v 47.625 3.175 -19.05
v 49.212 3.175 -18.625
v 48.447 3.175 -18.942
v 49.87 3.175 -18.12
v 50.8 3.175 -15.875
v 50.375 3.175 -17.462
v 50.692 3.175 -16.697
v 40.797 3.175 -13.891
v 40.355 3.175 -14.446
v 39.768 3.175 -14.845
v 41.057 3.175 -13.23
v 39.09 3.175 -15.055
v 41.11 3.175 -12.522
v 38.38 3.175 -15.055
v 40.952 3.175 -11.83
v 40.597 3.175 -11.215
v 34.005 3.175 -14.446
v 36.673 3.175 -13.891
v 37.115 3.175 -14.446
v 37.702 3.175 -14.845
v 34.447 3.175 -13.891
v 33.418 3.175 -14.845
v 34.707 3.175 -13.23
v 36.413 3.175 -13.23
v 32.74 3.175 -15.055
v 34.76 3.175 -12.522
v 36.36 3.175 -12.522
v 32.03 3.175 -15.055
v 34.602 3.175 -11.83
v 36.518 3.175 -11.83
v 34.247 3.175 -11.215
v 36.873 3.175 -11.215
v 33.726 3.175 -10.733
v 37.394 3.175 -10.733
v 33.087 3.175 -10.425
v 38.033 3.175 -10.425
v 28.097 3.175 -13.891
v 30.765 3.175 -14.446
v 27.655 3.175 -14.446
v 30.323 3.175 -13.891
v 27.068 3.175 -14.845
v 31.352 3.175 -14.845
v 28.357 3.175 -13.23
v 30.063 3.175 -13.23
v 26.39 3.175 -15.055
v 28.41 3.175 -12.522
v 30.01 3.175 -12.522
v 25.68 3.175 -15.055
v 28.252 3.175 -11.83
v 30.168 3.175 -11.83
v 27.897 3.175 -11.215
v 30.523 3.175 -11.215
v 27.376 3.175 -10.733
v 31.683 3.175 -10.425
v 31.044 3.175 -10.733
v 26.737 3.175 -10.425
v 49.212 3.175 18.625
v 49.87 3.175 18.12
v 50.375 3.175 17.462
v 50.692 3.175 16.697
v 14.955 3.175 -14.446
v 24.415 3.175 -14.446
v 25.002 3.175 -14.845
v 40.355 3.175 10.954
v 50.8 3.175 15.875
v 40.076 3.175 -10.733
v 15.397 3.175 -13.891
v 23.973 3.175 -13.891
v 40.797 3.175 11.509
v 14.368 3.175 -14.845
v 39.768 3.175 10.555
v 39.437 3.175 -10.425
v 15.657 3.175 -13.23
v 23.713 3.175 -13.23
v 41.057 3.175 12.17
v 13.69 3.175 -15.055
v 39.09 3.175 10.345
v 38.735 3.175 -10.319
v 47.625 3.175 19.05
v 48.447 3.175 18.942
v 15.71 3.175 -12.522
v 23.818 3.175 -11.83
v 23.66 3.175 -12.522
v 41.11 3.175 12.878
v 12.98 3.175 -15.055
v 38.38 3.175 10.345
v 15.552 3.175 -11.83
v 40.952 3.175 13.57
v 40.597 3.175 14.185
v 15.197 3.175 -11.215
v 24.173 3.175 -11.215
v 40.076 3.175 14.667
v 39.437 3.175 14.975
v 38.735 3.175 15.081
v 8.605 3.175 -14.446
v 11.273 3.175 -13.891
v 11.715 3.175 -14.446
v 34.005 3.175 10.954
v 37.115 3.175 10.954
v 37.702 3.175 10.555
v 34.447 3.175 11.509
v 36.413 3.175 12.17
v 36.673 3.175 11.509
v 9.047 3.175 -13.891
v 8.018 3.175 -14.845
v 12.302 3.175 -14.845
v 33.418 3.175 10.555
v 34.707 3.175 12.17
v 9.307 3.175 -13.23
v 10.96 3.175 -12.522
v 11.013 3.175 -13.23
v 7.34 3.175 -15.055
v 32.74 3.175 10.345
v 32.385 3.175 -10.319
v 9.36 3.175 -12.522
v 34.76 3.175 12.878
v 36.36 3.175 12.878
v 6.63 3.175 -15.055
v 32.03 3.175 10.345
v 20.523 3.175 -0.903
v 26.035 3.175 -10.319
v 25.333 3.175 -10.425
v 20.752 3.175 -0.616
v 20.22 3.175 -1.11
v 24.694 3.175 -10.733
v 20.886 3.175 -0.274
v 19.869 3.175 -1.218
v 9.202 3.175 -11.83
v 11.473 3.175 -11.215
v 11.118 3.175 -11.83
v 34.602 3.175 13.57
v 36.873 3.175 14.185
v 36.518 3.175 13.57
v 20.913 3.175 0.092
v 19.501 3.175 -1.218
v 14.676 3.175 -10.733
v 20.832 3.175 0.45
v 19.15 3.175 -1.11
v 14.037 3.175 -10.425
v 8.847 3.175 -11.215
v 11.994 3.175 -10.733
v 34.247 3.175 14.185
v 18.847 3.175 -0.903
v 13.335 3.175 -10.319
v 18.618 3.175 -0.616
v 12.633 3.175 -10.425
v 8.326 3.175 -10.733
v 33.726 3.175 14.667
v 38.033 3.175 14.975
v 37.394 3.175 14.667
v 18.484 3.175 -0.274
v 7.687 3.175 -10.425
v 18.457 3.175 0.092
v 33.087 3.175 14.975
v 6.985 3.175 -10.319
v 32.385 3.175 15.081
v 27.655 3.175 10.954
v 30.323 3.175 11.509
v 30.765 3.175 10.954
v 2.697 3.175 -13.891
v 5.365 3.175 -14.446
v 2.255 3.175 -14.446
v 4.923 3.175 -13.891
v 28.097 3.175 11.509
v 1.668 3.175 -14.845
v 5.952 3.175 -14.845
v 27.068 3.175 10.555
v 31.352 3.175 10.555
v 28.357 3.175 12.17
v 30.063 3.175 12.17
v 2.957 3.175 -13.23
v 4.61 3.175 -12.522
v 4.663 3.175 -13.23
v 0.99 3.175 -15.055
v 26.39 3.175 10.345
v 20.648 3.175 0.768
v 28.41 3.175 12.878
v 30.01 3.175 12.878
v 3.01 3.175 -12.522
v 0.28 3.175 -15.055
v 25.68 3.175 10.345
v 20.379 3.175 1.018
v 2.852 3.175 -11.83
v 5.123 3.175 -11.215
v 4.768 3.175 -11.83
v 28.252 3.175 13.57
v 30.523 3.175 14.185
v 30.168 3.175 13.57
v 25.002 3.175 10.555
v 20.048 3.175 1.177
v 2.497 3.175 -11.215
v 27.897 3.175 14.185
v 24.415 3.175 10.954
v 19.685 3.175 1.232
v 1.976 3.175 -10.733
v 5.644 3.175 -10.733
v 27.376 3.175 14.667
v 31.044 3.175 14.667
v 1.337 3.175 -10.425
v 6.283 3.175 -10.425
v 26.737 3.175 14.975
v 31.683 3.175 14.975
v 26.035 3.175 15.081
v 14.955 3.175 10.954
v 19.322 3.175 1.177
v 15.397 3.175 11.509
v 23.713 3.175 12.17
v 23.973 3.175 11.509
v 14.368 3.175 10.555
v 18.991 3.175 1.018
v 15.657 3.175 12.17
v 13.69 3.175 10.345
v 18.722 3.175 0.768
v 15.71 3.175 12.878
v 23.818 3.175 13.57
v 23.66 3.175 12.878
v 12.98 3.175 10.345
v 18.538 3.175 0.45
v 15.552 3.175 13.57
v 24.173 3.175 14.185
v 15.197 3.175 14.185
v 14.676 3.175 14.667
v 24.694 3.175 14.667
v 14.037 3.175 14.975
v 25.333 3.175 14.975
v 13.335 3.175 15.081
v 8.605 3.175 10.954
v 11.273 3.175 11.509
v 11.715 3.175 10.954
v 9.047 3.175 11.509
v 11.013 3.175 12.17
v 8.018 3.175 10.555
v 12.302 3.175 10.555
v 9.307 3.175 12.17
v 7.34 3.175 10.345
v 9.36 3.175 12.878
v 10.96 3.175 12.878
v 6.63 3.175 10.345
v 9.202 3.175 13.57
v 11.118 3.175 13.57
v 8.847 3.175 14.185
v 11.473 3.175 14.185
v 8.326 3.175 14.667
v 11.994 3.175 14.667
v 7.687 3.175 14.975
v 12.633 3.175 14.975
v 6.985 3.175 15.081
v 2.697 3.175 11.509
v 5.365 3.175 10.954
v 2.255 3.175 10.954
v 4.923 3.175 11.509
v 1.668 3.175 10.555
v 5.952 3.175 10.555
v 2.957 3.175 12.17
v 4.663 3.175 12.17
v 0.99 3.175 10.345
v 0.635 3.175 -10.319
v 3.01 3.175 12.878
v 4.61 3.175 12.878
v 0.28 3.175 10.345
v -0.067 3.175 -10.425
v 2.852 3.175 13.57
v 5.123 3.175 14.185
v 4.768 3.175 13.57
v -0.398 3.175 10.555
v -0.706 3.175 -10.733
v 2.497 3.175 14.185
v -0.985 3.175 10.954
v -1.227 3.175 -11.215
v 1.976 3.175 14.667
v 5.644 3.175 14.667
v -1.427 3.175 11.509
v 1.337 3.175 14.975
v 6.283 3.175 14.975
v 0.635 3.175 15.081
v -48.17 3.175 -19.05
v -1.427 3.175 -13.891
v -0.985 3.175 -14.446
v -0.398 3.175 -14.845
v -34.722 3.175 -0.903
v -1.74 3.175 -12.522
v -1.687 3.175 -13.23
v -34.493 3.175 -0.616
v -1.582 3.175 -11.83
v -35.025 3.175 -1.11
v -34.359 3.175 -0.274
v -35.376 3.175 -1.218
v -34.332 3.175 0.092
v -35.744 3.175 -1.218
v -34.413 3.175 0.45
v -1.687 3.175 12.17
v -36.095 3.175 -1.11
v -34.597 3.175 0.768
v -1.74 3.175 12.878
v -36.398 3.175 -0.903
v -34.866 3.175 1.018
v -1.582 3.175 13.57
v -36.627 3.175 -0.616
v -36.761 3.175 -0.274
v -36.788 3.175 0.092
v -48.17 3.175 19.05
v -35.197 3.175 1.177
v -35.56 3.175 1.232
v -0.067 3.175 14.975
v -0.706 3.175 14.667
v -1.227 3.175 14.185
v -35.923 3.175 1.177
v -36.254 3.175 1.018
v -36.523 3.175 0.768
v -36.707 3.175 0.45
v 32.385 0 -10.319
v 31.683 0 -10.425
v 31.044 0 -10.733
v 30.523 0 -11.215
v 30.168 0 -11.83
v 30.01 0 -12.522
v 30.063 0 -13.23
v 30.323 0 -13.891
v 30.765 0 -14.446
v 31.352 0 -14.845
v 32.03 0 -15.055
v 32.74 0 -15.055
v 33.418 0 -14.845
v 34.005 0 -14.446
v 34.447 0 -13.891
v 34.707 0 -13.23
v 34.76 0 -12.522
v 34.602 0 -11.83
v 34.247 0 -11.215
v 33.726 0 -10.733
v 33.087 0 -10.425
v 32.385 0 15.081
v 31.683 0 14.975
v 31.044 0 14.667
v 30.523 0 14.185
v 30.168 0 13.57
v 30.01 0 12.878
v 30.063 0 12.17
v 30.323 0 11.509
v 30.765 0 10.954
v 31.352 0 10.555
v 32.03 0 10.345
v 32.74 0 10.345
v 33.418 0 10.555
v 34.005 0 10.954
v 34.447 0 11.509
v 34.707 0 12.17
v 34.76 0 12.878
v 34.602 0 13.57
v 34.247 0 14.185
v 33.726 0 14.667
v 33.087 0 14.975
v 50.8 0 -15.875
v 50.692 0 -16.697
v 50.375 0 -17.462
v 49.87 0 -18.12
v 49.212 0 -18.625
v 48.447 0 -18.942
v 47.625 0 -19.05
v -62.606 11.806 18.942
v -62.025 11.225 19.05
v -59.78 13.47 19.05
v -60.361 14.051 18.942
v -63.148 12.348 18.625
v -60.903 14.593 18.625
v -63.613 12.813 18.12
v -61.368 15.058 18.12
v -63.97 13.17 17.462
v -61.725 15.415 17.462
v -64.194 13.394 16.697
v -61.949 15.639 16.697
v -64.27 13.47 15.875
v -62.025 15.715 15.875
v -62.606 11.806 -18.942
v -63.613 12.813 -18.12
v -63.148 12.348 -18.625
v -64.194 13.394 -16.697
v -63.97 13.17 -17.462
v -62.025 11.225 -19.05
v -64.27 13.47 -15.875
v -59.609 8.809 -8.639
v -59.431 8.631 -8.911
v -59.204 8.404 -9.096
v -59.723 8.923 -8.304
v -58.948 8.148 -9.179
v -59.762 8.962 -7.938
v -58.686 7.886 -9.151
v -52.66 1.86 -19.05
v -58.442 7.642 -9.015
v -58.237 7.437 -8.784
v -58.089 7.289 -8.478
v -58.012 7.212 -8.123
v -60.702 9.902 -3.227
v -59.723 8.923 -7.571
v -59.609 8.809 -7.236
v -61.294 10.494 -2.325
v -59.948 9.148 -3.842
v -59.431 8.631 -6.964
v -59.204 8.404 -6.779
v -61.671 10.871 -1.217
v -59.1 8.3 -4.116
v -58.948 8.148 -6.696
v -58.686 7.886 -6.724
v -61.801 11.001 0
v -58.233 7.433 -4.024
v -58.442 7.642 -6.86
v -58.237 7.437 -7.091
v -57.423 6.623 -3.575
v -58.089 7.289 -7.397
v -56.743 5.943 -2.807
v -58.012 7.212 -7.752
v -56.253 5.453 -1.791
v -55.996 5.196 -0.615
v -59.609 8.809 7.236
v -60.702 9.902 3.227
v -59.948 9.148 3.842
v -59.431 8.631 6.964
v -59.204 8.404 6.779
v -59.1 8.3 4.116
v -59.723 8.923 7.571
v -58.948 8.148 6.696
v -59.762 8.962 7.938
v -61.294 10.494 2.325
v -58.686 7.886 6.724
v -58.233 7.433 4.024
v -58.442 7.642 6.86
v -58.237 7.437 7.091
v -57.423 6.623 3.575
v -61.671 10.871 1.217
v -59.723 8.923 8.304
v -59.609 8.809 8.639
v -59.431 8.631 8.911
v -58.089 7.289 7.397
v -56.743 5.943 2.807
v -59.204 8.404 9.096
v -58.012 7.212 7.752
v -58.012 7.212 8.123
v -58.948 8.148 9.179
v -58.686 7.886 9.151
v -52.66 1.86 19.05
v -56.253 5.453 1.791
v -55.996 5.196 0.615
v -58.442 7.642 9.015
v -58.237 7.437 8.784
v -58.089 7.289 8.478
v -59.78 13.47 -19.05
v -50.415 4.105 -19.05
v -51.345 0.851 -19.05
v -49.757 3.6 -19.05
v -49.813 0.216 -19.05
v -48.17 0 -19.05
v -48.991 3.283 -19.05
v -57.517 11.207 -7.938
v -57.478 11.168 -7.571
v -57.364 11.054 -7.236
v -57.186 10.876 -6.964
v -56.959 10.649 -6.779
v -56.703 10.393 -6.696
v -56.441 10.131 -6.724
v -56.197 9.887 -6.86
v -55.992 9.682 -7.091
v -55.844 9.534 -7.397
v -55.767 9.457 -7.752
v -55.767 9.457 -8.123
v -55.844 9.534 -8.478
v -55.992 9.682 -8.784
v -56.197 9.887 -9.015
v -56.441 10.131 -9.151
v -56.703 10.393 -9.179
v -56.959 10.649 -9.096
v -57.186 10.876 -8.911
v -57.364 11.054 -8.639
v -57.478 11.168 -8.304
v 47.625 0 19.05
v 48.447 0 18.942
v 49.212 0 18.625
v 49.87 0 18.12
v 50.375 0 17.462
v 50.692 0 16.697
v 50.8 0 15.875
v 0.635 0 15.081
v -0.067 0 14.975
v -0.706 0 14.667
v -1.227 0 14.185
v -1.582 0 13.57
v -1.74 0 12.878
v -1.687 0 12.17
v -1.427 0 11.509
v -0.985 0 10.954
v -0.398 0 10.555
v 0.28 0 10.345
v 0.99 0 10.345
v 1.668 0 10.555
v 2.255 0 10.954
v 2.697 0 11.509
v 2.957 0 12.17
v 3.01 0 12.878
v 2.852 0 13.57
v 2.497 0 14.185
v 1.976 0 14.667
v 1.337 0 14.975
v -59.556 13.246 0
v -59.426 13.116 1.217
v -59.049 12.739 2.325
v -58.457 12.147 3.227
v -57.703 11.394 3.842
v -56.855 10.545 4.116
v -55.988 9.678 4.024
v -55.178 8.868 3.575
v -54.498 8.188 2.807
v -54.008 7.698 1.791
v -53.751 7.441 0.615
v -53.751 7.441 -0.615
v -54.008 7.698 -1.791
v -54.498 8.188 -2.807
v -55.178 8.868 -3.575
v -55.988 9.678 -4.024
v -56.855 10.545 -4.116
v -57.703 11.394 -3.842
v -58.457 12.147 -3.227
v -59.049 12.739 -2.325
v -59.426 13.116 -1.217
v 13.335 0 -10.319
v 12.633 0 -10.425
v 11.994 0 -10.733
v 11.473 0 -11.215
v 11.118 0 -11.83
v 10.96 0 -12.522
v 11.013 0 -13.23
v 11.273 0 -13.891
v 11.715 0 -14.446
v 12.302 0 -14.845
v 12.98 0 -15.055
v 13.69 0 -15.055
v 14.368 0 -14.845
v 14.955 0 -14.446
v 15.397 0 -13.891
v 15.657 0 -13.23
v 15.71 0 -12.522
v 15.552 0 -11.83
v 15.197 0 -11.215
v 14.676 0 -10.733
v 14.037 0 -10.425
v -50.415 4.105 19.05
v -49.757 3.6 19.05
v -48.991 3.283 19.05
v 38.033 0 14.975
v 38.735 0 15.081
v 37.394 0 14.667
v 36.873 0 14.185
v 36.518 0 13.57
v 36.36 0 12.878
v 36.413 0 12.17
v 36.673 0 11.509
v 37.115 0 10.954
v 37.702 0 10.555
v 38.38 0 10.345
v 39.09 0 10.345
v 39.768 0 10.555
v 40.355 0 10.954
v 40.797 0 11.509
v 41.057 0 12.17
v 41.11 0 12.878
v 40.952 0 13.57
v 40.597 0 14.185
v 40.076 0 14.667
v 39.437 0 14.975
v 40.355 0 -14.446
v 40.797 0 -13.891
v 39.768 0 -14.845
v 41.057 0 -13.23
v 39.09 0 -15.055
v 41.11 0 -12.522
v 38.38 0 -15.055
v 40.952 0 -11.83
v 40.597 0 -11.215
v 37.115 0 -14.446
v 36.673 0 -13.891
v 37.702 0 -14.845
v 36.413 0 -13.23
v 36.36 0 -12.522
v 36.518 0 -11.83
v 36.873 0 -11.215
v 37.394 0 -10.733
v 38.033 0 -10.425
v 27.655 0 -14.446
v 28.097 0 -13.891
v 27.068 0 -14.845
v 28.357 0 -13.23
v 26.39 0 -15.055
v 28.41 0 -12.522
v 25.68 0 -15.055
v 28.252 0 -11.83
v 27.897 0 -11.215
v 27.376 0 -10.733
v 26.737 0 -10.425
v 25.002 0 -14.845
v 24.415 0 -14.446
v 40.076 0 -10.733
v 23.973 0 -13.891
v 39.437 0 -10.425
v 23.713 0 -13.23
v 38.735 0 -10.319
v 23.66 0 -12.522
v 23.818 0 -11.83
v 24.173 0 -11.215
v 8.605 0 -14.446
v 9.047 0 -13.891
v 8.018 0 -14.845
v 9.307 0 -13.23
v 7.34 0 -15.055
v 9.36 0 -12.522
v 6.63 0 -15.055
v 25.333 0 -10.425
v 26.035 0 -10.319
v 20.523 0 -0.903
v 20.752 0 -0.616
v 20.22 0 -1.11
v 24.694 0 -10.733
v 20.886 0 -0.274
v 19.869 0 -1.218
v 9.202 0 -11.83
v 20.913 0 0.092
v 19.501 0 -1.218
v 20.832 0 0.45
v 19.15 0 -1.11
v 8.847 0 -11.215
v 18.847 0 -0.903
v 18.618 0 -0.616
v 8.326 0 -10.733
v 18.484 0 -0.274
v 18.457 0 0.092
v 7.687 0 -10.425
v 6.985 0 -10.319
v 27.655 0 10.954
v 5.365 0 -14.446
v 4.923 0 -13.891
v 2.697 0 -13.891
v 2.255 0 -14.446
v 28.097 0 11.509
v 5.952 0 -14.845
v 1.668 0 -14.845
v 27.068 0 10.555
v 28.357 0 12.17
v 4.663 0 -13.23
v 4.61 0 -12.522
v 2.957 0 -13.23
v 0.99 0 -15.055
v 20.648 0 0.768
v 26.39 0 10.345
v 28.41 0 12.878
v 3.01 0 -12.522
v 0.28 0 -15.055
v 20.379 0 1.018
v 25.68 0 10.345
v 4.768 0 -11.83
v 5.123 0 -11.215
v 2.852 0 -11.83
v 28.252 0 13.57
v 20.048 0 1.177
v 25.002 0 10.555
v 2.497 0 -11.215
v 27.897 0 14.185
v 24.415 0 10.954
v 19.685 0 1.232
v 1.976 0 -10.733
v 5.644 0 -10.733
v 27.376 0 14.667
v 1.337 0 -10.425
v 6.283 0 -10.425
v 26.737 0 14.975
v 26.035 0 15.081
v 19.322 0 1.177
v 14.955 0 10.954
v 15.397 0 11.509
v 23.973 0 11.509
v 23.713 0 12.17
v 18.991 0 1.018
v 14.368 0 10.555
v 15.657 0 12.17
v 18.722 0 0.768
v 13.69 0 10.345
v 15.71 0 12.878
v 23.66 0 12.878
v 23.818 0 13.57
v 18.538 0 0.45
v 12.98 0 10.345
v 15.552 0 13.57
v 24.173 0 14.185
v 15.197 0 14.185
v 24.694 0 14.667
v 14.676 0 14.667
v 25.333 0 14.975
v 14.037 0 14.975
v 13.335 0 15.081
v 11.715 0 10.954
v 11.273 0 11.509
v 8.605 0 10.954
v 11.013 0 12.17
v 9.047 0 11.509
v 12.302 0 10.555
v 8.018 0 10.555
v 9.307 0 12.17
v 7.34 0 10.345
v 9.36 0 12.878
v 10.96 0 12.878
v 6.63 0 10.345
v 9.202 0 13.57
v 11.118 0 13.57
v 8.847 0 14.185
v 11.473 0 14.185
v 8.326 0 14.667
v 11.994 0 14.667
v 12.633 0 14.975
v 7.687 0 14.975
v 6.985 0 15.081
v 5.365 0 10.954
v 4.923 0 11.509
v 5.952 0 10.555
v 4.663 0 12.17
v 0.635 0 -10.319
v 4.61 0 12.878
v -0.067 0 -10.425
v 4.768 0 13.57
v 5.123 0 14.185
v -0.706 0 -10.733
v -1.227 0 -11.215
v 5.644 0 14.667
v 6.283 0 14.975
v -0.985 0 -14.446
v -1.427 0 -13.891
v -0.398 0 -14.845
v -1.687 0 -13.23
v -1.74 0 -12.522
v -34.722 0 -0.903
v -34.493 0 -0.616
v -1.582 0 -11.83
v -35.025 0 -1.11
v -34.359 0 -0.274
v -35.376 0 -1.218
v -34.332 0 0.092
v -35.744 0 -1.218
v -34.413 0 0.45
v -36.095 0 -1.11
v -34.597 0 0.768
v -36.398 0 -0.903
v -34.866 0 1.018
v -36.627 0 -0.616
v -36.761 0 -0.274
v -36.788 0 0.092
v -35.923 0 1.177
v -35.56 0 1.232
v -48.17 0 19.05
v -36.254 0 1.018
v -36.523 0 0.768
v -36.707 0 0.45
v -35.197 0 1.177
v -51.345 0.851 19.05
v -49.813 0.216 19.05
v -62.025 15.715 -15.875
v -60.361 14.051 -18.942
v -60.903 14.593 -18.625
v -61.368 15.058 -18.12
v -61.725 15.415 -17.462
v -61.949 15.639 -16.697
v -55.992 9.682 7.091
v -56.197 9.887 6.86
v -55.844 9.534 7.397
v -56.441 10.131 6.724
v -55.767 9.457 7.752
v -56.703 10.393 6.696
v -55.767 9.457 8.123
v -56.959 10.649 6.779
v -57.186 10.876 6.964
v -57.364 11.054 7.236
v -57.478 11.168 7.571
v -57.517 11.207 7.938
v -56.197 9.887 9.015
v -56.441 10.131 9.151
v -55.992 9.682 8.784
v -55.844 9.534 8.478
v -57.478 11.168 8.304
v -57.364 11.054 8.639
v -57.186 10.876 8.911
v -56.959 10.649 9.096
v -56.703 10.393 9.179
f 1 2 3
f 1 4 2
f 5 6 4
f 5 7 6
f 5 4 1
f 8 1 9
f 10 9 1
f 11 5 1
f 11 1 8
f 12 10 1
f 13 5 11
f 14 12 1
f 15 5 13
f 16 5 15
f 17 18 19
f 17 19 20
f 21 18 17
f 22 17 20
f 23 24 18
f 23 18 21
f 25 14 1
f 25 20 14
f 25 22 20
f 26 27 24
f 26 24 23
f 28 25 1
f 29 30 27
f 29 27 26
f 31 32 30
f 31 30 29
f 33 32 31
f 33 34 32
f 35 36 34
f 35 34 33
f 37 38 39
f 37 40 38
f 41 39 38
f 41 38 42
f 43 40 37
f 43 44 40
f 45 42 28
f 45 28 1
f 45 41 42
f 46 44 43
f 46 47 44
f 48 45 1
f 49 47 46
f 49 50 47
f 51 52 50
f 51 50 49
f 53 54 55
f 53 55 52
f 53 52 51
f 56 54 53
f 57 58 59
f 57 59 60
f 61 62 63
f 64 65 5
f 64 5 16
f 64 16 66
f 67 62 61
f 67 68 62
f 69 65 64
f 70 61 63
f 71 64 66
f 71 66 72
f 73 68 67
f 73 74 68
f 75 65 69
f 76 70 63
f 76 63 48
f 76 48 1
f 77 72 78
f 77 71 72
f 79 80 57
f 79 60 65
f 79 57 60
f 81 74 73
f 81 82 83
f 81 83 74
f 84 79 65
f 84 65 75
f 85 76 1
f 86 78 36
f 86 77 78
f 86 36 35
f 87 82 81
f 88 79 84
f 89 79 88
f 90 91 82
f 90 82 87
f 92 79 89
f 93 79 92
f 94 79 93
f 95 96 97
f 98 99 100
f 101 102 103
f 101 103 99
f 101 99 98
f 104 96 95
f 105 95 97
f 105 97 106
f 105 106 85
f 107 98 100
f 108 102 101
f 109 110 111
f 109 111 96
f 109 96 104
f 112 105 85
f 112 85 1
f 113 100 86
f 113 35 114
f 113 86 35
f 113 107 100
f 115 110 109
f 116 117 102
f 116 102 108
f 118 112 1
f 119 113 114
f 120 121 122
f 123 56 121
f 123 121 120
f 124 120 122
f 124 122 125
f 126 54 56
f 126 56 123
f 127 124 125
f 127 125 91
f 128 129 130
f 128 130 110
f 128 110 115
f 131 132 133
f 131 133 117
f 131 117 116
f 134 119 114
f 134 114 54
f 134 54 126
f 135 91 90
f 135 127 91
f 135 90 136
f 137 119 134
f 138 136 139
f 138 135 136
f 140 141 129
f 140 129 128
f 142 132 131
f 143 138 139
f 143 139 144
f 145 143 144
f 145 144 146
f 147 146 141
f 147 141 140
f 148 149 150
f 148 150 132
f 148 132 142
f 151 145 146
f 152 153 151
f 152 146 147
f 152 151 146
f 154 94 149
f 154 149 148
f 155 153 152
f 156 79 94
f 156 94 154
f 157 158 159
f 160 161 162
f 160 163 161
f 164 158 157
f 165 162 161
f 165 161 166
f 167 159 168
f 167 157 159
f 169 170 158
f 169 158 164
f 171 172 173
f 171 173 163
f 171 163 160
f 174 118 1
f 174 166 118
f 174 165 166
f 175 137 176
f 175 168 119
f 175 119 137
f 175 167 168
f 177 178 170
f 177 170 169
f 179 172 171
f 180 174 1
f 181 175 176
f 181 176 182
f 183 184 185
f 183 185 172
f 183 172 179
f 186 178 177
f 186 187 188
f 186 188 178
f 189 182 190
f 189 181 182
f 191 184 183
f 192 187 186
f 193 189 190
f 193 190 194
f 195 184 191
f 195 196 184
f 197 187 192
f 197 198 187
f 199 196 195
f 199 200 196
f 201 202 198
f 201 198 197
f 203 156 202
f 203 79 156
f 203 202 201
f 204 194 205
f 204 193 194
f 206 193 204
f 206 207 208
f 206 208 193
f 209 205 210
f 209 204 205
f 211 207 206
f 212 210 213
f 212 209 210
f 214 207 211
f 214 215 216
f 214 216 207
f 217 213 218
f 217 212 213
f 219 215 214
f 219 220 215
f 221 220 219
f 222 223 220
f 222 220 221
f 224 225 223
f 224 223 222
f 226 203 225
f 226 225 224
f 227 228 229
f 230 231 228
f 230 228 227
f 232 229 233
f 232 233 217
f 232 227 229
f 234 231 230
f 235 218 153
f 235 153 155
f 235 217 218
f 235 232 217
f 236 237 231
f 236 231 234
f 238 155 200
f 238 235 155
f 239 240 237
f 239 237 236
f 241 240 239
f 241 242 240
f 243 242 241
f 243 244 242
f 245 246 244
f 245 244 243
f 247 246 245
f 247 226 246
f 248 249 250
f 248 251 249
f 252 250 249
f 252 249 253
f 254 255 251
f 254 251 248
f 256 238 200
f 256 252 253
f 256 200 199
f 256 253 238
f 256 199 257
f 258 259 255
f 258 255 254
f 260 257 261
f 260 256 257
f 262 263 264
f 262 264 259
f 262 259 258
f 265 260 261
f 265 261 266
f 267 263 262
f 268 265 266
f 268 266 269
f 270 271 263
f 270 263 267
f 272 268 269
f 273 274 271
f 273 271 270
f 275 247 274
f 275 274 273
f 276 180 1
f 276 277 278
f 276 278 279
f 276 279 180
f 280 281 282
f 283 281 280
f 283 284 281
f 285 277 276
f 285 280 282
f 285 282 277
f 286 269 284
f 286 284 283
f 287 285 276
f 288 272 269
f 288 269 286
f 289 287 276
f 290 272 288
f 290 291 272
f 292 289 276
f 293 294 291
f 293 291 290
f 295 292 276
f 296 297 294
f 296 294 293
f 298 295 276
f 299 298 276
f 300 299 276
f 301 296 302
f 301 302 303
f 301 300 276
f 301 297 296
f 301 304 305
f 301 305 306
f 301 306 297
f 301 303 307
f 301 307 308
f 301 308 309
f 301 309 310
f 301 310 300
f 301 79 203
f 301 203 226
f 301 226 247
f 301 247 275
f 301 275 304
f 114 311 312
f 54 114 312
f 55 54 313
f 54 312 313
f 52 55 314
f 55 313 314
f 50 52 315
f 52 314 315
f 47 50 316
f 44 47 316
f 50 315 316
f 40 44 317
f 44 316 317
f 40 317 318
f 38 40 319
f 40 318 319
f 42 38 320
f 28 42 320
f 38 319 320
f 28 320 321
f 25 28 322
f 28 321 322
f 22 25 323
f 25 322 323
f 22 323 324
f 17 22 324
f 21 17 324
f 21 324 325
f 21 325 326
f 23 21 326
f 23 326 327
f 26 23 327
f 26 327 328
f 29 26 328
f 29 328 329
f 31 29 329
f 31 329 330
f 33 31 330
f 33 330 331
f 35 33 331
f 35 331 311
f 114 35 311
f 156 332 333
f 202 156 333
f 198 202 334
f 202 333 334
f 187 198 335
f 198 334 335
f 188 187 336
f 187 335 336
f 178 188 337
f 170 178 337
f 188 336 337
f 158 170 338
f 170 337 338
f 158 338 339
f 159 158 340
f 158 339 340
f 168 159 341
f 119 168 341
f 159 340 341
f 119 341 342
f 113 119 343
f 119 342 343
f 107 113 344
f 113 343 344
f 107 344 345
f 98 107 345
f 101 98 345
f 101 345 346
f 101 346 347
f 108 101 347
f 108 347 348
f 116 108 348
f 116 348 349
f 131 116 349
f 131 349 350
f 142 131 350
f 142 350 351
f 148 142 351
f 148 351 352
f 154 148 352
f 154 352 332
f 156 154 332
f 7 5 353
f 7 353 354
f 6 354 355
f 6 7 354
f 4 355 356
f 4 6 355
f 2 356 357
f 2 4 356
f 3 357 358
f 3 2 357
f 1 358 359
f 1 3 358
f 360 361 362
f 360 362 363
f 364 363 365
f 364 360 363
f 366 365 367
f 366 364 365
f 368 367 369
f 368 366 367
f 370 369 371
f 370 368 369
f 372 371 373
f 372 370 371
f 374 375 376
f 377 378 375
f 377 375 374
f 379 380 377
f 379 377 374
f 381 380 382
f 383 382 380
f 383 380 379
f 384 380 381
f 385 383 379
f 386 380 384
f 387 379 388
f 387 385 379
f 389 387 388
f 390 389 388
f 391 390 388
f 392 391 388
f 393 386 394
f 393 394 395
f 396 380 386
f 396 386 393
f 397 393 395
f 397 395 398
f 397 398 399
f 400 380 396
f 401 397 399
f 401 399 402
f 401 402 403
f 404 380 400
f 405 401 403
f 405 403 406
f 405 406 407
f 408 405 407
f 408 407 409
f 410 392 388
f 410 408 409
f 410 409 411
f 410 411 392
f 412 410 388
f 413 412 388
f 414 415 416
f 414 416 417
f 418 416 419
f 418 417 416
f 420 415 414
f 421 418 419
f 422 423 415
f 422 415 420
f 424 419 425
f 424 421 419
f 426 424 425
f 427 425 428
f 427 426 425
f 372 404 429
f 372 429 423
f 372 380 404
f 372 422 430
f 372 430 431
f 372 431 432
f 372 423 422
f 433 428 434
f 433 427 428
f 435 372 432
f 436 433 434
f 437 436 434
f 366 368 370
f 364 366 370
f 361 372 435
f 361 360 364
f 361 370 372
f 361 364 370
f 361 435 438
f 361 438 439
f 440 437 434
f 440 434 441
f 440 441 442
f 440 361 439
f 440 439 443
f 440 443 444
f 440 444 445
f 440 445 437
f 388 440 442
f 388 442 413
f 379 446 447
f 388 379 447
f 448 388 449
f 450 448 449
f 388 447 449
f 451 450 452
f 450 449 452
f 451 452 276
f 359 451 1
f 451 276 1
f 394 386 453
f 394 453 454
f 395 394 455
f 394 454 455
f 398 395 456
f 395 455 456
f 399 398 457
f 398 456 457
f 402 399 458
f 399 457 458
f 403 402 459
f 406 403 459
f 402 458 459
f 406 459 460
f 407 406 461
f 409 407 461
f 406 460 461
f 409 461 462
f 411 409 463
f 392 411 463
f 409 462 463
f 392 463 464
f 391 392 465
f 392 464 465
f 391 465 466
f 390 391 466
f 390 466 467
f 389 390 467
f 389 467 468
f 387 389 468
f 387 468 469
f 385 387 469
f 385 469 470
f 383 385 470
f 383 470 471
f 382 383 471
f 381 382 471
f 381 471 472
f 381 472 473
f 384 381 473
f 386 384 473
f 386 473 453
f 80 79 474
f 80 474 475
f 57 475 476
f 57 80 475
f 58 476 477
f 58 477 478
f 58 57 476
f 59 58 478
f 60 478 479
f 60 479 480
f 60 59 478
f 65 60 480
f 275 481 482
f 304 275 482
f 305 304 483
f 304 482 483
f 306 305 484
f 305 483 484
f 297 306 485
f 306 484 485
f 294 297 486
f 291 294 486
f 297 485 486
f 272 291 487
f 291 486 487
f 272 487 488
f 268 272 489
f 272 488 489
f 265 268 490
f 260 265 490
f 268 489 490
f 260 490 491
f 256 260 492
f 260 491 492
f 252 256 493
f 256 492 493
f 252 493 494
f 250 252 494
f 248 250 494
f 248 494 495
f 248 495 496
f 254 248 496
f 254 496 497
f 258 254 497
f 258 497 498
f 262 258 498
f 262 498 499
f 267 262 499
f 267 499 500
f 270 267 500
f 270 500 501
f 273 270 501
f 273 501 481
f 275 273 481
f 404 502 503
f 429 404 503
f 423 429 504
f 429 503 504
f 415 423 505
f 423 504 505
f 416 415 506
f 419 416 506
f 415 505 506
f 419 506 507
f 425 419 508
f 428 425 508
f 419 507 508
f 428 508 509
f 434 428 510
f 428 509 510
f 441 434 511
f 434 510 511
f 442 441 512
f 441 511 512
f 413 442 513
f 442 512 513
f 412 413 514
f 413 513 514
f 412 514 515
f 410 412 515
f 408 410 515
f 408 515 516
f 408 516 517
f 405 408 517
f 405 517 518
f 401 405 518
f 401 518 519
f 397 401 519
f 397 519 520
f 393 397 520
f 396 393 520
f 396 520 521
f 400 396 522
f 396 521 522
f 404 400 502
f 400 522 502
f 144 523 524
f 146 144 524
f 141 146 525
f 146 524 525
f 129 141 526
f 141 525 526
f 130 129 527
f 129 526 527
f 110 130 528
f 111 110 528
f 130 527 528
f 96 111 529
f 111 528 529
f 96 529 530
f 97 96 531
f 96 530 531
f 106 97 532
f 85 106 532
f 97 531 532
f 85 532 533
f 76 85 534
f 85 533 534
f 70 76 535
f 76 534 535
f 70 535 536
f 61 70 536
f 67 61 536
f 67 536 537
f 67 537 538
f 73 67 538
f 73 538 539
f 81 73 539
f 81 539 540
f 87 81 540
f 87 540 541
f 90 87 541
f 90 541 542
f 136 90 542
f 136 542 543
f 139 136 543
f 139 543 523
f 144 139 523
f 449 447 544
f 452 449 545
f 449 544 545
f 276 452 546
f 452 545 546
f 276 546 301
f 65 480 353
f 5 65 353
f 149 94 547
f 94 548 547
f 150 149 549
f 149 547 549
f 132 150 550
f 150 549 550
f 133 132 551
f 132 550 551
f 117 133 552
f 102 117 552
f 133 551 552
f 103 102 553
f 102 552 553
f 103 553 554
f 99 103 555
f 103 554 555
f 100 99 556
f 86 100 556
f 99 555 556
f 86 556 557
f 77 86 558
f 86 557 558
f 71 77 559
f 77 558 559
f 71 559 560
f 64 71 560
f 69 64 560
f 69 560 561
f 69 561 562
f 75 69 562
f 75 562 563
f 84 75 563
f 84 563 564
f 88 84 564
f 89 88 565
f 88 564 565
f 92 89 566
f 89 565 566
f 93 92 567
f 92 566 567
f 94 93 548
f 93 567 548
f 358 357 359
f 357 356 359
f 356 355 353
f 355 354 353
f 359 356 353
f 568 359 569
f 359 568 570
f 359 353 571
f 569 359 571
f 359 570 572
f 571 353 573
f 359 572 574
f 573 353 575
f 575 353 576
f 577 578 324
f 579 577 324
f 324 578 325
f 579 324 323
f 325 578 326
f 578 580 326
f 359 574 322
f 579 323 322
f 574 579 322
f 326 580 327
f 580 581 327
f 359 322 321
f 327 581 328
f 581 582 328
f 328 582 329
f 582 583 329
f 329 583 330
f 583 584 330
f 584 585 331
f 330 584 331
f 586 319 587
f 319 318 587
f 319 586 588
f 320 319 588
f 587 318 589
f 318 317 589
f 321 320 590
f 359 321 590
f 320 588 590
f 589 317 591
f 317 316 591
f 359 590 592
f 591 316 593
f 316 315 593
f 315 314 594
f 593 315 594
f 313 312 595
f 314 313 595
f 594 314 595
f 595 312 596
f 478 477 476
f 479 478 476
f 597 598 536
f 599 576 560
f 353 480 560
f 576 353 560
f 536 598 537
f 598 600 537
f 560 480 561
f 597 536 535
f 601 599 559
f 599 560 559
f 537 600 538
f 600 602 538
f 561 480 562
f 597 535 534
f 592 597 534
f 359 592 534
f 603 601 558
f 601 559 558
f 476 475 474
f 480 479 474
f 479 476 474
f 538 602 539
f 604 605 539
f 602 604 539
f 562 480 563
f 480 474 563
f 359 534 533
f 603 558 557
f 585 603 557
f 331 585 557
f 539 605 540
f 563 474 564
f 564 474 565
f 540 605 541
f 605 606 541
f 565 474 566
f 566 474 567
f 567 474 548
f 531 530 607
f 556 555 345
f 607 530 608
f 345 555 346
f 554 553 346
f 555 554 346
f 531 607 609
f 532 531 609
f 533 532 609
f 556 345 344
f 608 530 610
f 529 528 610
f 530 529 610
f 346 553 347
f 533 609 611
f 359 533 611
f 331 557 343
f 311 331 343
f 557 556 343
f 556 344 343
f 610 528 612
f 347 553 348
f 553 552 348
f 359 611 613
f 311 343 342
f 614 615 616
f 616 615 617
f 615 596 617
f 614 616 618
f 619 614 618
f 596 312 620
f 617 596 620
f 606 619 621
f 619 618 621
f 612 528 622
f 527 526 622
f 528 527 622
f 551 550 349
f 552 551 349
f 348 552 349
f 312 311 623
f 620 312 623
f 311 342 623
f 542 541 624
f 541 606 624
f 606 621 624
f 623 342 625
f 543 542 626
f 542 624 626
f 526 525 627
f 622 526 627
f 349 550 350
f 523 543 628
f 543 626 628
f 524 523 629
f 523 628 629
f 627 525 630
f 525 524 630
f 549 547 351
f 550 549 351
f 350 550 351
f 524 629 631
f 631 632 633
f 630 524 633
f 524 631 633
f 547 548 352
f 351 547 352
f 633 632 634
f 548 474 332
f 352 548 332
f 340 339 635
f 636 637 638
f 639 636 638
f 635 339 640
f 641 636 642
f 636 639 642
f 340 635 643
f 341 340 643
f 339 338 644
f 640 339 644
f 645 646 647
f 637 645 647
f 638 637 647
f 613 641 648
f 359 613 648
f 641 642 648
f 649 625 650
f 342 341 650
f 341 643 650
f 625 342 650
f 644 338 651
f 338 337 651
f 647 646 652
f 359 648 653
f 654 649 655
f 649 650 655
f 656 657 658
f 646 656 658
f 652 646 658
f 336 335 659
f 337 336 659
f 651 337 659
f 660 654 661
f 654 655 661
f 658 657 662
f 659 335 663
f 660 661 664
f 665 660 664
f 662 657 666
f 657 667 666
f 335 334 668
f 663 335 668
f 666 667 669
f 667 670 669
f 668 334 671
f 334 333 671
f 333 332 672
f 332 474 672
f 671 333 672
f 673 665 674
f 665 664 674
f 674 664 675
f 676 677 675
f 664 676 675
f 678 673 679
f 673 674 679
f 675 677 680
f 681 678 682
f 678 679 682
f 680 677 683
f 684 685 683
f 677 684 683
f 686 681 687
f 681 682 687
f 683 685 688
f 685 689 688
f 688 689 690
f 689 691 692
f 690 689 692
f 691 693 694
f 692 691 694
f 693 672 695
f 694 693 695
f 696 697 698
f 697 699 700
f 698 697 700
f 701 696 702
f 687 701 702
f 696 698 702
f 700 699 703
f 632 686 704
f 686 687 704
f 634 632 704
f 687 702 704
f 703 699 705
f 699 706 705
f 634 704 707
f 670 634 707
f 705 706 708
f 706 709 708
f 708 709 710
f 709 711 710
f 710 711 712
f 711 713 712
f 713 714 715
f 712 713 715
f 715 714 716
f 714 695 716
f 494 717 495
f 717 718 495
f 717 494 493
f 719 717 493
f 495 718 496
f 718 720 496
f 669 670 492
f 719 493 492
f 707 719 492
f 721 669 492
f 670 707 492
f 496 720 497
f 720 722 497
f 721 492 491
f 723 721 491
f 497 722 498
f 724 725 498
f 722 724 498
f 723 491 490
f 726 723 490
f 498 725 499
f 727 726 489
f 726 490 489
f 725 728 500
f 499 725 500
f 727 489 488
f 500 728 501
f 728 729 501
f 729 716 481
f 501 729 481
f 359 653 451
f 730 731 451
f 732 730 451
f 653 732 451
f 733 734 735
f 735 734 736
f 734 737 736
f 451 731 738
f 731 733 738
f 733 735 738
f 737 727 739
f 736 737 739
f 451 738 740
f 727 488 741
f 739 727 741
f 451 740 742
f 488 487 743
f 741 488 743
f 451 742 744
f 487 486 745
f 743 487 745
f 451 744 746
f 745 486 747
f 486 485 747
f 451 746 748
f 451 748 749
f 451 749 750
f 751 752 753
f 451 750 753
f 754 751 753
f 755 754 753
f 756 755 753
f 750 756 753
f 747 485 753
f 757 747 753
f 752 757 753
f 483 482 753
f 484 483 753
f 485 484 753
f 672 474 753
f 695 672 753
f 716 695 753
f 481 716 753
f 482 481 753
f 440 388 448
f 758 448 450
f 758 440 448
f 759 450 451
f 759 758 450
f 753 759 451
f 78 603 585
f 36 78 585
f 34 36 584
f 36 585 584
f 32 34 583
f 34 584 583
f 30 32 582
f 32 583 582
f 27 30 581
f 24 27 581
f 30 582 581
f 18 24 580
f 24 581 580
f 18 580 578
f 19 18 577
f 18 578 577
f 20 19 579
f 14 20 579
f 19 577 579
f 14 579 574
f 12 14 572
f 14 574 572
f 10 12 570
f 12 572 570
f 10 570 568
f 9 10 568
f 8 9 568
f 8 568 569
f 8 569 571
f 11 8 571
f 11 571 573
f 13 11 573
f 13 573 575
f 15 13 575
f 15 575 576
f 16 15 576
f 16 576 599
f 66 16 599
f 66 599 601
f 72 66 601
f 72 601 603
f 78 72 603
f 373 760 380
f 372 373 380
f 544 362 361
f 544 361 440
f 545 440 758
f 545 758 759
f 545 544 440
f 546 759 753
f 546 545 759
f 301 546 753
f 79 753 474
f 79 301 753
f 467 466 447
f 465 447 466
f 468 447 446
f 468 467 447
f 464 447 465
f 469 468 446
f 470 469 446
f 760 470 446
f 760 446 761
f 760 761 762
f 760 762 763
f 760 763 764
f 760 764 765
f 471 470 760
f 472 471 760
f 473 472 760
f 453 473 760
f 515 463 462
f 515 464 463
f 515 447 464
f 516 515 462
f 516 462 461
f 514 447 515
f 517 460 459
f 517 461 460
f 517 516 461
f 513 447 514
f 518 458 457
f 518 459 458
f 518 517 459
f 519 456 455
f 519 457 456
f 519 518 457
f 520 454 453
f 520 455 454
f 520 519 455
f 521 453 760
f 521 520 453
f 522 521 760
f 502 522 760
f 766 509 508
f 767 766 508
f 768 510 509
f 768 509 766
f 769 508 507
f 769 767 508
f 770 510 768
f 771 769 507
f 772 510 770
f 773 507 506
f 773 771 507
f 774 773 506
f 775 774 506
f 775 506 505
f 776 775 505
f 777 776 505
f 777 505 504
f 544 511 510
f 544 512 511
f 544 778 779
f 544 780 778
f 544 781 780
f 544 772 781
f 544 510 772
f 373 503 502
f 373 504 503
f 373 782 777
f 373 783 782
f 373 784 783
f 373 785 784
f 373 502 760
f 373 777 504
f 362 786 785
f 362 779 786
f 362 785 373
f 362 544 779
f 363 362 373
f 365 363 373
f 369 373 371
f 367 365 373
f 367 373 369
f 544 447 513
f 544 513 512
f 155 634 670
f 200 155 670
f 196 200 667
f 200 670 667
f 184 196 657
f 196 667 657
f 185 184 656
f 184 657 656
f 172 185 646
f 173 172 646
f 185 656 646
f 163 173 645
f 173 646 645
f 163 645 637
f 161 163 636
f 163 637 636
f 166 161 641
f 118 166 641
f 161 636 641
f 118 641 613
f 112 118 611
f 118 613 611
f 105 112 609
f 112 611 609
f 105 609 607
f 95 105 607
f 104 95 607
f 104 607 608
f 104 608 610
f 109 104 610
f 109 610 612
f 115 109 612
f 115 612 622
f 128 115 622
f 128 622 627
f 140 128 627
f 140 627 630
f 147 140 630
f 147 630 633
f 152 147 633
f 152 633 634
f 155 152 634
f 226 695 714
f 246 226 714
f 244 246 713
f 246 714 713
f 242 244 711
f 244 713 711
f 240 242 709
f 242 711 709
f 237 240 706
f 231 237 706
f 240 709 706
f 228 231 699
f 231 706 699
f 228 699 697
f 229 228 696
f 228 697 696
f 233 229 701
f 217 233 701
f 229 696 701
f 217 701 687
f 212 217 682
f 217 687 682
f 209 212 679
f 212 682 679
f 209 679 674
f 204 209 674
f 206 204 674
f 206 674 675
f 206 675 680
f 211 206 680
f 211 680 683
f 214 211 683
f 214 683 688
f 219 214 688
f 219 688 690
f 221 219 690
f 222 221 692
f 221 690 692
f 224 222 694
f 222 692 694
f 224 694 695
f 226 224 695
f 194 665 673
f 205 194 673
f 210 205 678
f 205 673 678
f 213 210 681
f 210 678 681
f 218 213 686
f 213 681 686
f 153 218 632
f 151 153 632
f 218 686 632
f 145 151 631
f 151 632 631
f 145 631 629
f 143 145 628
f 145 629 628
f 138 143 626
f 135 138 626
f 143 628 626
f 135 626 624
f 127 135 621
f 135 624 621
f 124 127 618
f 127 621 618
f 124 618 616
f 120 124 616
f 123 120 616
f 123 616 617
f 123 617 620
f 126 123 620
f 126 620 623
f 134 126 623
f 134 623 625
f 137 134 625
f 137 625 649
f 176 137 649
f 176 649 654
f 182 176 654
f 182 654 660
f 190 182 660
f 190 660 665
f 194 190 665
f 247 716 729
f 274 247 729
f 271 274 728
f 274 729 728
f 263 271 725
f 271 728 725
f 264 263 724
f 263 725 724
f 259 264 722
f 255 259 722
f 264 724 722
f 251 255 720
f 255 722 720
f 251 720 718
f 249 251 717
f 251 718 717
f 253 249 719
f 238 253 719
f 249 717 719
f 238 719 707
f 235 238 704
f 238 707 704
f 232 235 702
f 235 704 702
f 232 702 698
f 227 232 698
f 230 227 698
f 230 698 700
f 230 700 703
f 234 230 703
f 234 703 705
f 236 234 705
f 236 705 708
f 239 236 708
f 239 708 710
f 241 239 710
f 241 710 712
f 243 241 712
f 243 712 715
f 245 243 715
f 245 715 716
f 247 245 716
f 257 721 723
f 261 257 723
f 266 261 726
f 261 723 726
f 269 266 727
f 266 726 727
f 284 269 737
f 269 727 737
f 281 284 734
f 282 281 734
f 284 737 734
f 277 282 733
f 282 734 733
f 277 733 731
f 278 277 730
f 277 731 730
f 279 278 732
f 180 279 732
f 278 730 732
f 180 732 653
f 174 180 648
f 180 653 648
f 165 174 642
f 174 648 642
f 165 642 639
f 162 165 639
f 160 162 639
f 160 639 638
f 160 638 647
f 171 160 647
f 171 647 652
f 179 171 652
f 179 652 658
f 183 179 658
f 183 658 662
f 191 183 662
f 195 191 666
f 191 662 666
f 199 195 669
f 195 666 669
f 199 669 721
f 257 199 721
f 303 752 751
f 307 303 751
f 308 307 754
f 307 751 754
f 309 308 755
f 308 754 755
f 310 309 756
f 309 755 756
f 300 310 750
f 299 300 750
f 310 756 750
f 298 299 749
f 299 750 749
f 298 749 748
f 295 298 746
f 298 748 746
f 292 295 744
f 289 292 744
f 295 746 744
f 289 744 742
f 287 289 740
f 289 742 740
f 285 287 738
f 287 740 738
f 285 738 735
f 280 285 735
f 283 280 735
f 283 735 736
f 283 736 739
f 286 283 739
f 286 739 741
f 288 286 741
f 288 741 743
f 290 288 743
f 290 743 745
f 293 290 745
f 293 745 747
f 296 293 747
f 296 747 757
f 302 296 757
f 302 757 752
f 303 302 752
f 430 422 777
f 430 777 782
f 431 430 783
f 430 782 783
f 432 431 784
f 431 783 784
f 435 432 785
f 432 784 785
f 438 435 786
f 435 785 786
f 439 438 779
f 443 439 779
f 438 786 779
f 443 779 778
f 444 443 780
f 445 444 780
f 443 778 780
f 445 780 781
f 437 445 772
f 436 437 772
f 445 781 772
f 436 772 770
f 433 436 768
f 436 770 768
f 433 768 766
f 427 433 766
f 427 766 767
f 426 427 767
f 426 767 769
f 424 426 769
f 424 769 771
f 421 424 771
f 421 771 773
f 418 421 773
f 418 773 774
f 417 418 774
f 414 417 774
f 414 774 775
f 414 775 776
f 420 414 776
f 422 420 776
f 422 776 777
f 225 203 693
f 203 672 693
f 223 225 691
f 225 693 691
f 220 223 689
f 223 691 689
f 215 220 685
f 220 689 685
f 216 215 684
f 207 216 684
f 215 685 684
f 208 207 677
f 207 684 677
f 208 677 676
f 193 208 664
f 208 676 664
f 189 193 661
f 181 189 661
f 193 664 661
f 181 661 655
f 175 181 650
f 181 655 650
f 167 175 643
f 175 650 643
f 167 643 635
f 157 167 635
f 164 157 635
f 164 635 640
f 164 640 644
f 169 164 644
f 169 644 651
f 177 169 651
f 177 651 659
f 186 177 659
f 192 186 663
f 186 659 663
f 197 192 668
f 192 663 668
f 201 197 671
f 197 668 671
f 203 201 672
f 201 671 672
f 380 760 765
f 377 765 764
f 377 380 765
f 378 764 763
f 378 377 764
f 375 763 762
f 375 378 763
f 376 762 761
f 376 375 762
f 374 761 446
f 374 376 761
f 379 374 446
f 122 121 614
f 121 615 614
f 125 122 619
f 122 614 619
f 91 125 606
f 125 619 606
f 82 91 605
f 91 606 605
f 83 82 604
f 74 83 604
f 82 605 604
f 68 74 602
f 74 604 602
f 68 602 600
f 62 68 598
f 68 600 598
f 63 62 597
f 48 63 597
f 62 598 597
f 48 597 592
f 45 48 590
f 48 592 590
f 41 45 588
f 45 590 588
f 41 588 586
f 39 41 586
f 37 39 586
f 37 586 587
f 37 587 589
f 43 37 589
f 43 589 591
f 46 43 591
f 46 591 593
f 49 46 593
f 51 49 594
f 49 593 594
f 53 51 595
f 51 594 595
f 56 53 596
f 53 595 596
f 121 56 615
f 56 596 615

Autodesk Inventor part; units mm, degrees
ref_plane "YZ Plane" through (0, 0, 0) normal (1, 0, 0) x (0, 1, 0)
ref_plane "XZ Plane" through (0, 0, 0) normal (0, 1, 0) x (-1, 0, 0)
ref_plane "XY Plane" through (0, 0, 0) normal (0, 0, 1) x (1, 0, 0)
sketch "Sketch1" plane through (0, 0, 0) normal (0, 1, 0) x (-1, 0, 0)
  line L0 (-50.8, -19.05) -> (50.8, -19.05)
  line L1 (50.8, -19.05) -> (50.8, 19.05)
  line L2 (50.8, 19.05) -> (-50.8, 19.05)
  line L3 (-50.8, 19.05) -> (-50.8, -19.05)
  line L4 (-50.8, -19.05) -> (50.8, 19.05) construction
  line L5 (50.8, -19.05) -> (-50.8, 19.05) construction
  point P0 (0, 0)
  dimension "d0" = 38.1
  dimension "d1" = 101.6
extrude "Plate1" add sketch "Sketch1" along normal blind 3.175
sketch "Sketch2" plane through (-48.5549, 2.2451, 19.05) normal (-0.7071068, -0.7071068, 0) x (0.7071068, -0.7071068, 0)
  line L0 (0, -38.1) -> (0, 0)
  line L1 (0, 0) -> (-19.05, 0)
  line L2 (-19.05, 0) -> (-19.05, -38.1)
  line L3 (-19.05, -38.1) -> (0, -38.1)
edge flange "Flange1" height 19.05 angle 45 thickness 3.175 bend radius 3.175 thickness toward (-0.7071068, -0.7071068, 0) relief tear relief width 3.175 relief depth 1.5875 edges at (-50.8, 3.175, 0) wall of the first edge with corners at (-48.5549, 2.2451, -19.05) (-48.5549, 2.2451, 19.05) (-62.0253, 15.7154, 19.05) (-62.0253, 15.7154, -19.05)
bend "Bend1"
corner "Corner1"
sketch "Sketch3" plane through (-62.0253, 15.7154, -19.05) normal (0.7071068, 0.7071068, 0) x (-0.7071068, 0.7071068, 0)
  circle A0 centre (-7.62, 19.05) radius 4.1275
  circle A1 centre (-7.62, 26.9875) radius 1.2446
  circle A2 centre (-7.62, 11.1125) radius 1.2446
  line L0 (-132.4339, 19.05) -> (42.7893, 19.05) projected
  line L1 (0, 0) -> (0, 38.1) projected
  point P0 (-54.971, 19.05)
  dimension "d13" = 8.255
  dimension "d14" = 2.4892
  dimension "d15" = 7.9375
  dimension "d16" = 7.9375
  dimension "d17" = 7.62
extrude "Cut1" cut sketch "Sketch3" against normal blind 3.175
sketch "Sketch4" plane through (0, 3.175, 0) normal (0, 1, 0) x (1, 0, 0)
  line L0 (32.385, -12.7) -> (6.985, -12.7)
  line L1 (6.985, -12.7) -> (6.985, 12.7)
  line L2 (6.985, 12.7) -> (32.385, 12.7)
  line L3 (32.385, 12.7) -> (32.385, -12.7)
  line L4 (32.385, -12.7) -> (6.985, 12.7) construction
  line L5 (6.985, -12.7) -> (32.385, 12.7) construction
  line L6 (50.8, 19.05) -> (50.8, -19.05) projected
  point P0 (0, 0)
  point P1 (19.685, 0)
  point P2 (32.385, -12.7)
  point P3 (38.735, -12.7)
  point P4 (26.035, -12.7)
  point P5 (13.335, -12.7)
  point P6 (0.635, -12.7)
  point P7 (13.335, 12.7)
  point P8 (0.635, 12.7)
  point P9 (26.035, 12.7)
  point P10 (38.735, 12.7)
  point P11 (-35.56, 0)
  point P12 (19.685, 0)
  point P13 (19.685, 0)
  dimension "d20" = 25.4
  dimension "d21" = 25.4
  dimension "d32" = 19.685
  dimension "d33" = 6.35
  dimension "d34" = 6.35
  dimension "d35" = 6.35
  dimension "d36" = 6.35
  dimension "d37" = 35.56
hole "Hole1" at (6.985, 3.175, -12.7) at (32.385, 3.175, -12.7) at (32.385, 3.175, 12.7) at (6.985, 3.175, 12.7) at (38.735, 3.175, 12.7) at (26.035, 3.175, 12.7) at (38.735, 3.175, -12.7) at (13.335, 3.175, -12.7) at (26.035, 3.175, -12.7) at (0.635, 3.175, -12.7) at (0.635, 3.175, 12.7) at (13.335, 3.175, 12.7) direction (0, -1, 0) diameter 4.7625 depth 3.175 tip angle 118
fillet "Corner Round1" radius 3.175 4 edges at (-63.1479, 14.5929, -19.05) (-63.1479, 14.5929, 19.05) (50.8, 1.5875, -19.05) (50.8, 1.5875, 19.05)
sketch "Sketch5" plane through (0, 0, 0) normal (0, 0, 1) x (1, 0, 0)
  line L0 (-104.5658, 0) -> (17.4276, 0) projected
  line L1 (17.4757, 84.4402) -> (-106.4259, -39.4614) projected
  line L2 (-52.6599, 1.8599) -> (-62.0253, 11.2253) projected
  line L3 (-58.8822, 8.0822) -> (-90.3131, -23.3487)
  point P0 (0, 0)
  dimension "d31" = 44.45
hole "Hole2" at (-35.56, 3.175, 0) at (19.685, 3.175, 0) direction (0, -1, 0) diameter 2.4638 end through all
equation "\"d18\" = Thickness"
equation "\"d28\" = Thickness"
equation "\"d3\" = BendReliefWidth"
equation "\"d4\" = BendReliefDepth"
equation "\"d5\" = MinimumRemnant"
equation "\"d6\" = BendRadius"
equation "\"d9\" = BendRadius"
equation "\"d10\" = CornerReliefSize"
equation "\"d11\" = GapSize"
equation "\"d12\" = JacobiRadiusSize"
equation "\"BendRadius\" = Thickness"
equation "\"BendReliefWidth\" = Thickness"
equation "\"BendReliefDepth\" = 0.5 * Thickness"
equation "\"CornerReliefSize\" = 4 * Thickness"
equation "\"MinimumRemnant\" = 2 * Thickness"
equation "\"TransitionRadius\" = BendRadius"
equation "\"JacobiRadiusSize\" = BendRadius"
equation "\"GapSize\" = Thickness"
equation "\"d2\" = BendRadius"
equation "\"Thickness\" = 3.175"
properties part number "J005232" material "ALUMINUM, 5052-H32"
